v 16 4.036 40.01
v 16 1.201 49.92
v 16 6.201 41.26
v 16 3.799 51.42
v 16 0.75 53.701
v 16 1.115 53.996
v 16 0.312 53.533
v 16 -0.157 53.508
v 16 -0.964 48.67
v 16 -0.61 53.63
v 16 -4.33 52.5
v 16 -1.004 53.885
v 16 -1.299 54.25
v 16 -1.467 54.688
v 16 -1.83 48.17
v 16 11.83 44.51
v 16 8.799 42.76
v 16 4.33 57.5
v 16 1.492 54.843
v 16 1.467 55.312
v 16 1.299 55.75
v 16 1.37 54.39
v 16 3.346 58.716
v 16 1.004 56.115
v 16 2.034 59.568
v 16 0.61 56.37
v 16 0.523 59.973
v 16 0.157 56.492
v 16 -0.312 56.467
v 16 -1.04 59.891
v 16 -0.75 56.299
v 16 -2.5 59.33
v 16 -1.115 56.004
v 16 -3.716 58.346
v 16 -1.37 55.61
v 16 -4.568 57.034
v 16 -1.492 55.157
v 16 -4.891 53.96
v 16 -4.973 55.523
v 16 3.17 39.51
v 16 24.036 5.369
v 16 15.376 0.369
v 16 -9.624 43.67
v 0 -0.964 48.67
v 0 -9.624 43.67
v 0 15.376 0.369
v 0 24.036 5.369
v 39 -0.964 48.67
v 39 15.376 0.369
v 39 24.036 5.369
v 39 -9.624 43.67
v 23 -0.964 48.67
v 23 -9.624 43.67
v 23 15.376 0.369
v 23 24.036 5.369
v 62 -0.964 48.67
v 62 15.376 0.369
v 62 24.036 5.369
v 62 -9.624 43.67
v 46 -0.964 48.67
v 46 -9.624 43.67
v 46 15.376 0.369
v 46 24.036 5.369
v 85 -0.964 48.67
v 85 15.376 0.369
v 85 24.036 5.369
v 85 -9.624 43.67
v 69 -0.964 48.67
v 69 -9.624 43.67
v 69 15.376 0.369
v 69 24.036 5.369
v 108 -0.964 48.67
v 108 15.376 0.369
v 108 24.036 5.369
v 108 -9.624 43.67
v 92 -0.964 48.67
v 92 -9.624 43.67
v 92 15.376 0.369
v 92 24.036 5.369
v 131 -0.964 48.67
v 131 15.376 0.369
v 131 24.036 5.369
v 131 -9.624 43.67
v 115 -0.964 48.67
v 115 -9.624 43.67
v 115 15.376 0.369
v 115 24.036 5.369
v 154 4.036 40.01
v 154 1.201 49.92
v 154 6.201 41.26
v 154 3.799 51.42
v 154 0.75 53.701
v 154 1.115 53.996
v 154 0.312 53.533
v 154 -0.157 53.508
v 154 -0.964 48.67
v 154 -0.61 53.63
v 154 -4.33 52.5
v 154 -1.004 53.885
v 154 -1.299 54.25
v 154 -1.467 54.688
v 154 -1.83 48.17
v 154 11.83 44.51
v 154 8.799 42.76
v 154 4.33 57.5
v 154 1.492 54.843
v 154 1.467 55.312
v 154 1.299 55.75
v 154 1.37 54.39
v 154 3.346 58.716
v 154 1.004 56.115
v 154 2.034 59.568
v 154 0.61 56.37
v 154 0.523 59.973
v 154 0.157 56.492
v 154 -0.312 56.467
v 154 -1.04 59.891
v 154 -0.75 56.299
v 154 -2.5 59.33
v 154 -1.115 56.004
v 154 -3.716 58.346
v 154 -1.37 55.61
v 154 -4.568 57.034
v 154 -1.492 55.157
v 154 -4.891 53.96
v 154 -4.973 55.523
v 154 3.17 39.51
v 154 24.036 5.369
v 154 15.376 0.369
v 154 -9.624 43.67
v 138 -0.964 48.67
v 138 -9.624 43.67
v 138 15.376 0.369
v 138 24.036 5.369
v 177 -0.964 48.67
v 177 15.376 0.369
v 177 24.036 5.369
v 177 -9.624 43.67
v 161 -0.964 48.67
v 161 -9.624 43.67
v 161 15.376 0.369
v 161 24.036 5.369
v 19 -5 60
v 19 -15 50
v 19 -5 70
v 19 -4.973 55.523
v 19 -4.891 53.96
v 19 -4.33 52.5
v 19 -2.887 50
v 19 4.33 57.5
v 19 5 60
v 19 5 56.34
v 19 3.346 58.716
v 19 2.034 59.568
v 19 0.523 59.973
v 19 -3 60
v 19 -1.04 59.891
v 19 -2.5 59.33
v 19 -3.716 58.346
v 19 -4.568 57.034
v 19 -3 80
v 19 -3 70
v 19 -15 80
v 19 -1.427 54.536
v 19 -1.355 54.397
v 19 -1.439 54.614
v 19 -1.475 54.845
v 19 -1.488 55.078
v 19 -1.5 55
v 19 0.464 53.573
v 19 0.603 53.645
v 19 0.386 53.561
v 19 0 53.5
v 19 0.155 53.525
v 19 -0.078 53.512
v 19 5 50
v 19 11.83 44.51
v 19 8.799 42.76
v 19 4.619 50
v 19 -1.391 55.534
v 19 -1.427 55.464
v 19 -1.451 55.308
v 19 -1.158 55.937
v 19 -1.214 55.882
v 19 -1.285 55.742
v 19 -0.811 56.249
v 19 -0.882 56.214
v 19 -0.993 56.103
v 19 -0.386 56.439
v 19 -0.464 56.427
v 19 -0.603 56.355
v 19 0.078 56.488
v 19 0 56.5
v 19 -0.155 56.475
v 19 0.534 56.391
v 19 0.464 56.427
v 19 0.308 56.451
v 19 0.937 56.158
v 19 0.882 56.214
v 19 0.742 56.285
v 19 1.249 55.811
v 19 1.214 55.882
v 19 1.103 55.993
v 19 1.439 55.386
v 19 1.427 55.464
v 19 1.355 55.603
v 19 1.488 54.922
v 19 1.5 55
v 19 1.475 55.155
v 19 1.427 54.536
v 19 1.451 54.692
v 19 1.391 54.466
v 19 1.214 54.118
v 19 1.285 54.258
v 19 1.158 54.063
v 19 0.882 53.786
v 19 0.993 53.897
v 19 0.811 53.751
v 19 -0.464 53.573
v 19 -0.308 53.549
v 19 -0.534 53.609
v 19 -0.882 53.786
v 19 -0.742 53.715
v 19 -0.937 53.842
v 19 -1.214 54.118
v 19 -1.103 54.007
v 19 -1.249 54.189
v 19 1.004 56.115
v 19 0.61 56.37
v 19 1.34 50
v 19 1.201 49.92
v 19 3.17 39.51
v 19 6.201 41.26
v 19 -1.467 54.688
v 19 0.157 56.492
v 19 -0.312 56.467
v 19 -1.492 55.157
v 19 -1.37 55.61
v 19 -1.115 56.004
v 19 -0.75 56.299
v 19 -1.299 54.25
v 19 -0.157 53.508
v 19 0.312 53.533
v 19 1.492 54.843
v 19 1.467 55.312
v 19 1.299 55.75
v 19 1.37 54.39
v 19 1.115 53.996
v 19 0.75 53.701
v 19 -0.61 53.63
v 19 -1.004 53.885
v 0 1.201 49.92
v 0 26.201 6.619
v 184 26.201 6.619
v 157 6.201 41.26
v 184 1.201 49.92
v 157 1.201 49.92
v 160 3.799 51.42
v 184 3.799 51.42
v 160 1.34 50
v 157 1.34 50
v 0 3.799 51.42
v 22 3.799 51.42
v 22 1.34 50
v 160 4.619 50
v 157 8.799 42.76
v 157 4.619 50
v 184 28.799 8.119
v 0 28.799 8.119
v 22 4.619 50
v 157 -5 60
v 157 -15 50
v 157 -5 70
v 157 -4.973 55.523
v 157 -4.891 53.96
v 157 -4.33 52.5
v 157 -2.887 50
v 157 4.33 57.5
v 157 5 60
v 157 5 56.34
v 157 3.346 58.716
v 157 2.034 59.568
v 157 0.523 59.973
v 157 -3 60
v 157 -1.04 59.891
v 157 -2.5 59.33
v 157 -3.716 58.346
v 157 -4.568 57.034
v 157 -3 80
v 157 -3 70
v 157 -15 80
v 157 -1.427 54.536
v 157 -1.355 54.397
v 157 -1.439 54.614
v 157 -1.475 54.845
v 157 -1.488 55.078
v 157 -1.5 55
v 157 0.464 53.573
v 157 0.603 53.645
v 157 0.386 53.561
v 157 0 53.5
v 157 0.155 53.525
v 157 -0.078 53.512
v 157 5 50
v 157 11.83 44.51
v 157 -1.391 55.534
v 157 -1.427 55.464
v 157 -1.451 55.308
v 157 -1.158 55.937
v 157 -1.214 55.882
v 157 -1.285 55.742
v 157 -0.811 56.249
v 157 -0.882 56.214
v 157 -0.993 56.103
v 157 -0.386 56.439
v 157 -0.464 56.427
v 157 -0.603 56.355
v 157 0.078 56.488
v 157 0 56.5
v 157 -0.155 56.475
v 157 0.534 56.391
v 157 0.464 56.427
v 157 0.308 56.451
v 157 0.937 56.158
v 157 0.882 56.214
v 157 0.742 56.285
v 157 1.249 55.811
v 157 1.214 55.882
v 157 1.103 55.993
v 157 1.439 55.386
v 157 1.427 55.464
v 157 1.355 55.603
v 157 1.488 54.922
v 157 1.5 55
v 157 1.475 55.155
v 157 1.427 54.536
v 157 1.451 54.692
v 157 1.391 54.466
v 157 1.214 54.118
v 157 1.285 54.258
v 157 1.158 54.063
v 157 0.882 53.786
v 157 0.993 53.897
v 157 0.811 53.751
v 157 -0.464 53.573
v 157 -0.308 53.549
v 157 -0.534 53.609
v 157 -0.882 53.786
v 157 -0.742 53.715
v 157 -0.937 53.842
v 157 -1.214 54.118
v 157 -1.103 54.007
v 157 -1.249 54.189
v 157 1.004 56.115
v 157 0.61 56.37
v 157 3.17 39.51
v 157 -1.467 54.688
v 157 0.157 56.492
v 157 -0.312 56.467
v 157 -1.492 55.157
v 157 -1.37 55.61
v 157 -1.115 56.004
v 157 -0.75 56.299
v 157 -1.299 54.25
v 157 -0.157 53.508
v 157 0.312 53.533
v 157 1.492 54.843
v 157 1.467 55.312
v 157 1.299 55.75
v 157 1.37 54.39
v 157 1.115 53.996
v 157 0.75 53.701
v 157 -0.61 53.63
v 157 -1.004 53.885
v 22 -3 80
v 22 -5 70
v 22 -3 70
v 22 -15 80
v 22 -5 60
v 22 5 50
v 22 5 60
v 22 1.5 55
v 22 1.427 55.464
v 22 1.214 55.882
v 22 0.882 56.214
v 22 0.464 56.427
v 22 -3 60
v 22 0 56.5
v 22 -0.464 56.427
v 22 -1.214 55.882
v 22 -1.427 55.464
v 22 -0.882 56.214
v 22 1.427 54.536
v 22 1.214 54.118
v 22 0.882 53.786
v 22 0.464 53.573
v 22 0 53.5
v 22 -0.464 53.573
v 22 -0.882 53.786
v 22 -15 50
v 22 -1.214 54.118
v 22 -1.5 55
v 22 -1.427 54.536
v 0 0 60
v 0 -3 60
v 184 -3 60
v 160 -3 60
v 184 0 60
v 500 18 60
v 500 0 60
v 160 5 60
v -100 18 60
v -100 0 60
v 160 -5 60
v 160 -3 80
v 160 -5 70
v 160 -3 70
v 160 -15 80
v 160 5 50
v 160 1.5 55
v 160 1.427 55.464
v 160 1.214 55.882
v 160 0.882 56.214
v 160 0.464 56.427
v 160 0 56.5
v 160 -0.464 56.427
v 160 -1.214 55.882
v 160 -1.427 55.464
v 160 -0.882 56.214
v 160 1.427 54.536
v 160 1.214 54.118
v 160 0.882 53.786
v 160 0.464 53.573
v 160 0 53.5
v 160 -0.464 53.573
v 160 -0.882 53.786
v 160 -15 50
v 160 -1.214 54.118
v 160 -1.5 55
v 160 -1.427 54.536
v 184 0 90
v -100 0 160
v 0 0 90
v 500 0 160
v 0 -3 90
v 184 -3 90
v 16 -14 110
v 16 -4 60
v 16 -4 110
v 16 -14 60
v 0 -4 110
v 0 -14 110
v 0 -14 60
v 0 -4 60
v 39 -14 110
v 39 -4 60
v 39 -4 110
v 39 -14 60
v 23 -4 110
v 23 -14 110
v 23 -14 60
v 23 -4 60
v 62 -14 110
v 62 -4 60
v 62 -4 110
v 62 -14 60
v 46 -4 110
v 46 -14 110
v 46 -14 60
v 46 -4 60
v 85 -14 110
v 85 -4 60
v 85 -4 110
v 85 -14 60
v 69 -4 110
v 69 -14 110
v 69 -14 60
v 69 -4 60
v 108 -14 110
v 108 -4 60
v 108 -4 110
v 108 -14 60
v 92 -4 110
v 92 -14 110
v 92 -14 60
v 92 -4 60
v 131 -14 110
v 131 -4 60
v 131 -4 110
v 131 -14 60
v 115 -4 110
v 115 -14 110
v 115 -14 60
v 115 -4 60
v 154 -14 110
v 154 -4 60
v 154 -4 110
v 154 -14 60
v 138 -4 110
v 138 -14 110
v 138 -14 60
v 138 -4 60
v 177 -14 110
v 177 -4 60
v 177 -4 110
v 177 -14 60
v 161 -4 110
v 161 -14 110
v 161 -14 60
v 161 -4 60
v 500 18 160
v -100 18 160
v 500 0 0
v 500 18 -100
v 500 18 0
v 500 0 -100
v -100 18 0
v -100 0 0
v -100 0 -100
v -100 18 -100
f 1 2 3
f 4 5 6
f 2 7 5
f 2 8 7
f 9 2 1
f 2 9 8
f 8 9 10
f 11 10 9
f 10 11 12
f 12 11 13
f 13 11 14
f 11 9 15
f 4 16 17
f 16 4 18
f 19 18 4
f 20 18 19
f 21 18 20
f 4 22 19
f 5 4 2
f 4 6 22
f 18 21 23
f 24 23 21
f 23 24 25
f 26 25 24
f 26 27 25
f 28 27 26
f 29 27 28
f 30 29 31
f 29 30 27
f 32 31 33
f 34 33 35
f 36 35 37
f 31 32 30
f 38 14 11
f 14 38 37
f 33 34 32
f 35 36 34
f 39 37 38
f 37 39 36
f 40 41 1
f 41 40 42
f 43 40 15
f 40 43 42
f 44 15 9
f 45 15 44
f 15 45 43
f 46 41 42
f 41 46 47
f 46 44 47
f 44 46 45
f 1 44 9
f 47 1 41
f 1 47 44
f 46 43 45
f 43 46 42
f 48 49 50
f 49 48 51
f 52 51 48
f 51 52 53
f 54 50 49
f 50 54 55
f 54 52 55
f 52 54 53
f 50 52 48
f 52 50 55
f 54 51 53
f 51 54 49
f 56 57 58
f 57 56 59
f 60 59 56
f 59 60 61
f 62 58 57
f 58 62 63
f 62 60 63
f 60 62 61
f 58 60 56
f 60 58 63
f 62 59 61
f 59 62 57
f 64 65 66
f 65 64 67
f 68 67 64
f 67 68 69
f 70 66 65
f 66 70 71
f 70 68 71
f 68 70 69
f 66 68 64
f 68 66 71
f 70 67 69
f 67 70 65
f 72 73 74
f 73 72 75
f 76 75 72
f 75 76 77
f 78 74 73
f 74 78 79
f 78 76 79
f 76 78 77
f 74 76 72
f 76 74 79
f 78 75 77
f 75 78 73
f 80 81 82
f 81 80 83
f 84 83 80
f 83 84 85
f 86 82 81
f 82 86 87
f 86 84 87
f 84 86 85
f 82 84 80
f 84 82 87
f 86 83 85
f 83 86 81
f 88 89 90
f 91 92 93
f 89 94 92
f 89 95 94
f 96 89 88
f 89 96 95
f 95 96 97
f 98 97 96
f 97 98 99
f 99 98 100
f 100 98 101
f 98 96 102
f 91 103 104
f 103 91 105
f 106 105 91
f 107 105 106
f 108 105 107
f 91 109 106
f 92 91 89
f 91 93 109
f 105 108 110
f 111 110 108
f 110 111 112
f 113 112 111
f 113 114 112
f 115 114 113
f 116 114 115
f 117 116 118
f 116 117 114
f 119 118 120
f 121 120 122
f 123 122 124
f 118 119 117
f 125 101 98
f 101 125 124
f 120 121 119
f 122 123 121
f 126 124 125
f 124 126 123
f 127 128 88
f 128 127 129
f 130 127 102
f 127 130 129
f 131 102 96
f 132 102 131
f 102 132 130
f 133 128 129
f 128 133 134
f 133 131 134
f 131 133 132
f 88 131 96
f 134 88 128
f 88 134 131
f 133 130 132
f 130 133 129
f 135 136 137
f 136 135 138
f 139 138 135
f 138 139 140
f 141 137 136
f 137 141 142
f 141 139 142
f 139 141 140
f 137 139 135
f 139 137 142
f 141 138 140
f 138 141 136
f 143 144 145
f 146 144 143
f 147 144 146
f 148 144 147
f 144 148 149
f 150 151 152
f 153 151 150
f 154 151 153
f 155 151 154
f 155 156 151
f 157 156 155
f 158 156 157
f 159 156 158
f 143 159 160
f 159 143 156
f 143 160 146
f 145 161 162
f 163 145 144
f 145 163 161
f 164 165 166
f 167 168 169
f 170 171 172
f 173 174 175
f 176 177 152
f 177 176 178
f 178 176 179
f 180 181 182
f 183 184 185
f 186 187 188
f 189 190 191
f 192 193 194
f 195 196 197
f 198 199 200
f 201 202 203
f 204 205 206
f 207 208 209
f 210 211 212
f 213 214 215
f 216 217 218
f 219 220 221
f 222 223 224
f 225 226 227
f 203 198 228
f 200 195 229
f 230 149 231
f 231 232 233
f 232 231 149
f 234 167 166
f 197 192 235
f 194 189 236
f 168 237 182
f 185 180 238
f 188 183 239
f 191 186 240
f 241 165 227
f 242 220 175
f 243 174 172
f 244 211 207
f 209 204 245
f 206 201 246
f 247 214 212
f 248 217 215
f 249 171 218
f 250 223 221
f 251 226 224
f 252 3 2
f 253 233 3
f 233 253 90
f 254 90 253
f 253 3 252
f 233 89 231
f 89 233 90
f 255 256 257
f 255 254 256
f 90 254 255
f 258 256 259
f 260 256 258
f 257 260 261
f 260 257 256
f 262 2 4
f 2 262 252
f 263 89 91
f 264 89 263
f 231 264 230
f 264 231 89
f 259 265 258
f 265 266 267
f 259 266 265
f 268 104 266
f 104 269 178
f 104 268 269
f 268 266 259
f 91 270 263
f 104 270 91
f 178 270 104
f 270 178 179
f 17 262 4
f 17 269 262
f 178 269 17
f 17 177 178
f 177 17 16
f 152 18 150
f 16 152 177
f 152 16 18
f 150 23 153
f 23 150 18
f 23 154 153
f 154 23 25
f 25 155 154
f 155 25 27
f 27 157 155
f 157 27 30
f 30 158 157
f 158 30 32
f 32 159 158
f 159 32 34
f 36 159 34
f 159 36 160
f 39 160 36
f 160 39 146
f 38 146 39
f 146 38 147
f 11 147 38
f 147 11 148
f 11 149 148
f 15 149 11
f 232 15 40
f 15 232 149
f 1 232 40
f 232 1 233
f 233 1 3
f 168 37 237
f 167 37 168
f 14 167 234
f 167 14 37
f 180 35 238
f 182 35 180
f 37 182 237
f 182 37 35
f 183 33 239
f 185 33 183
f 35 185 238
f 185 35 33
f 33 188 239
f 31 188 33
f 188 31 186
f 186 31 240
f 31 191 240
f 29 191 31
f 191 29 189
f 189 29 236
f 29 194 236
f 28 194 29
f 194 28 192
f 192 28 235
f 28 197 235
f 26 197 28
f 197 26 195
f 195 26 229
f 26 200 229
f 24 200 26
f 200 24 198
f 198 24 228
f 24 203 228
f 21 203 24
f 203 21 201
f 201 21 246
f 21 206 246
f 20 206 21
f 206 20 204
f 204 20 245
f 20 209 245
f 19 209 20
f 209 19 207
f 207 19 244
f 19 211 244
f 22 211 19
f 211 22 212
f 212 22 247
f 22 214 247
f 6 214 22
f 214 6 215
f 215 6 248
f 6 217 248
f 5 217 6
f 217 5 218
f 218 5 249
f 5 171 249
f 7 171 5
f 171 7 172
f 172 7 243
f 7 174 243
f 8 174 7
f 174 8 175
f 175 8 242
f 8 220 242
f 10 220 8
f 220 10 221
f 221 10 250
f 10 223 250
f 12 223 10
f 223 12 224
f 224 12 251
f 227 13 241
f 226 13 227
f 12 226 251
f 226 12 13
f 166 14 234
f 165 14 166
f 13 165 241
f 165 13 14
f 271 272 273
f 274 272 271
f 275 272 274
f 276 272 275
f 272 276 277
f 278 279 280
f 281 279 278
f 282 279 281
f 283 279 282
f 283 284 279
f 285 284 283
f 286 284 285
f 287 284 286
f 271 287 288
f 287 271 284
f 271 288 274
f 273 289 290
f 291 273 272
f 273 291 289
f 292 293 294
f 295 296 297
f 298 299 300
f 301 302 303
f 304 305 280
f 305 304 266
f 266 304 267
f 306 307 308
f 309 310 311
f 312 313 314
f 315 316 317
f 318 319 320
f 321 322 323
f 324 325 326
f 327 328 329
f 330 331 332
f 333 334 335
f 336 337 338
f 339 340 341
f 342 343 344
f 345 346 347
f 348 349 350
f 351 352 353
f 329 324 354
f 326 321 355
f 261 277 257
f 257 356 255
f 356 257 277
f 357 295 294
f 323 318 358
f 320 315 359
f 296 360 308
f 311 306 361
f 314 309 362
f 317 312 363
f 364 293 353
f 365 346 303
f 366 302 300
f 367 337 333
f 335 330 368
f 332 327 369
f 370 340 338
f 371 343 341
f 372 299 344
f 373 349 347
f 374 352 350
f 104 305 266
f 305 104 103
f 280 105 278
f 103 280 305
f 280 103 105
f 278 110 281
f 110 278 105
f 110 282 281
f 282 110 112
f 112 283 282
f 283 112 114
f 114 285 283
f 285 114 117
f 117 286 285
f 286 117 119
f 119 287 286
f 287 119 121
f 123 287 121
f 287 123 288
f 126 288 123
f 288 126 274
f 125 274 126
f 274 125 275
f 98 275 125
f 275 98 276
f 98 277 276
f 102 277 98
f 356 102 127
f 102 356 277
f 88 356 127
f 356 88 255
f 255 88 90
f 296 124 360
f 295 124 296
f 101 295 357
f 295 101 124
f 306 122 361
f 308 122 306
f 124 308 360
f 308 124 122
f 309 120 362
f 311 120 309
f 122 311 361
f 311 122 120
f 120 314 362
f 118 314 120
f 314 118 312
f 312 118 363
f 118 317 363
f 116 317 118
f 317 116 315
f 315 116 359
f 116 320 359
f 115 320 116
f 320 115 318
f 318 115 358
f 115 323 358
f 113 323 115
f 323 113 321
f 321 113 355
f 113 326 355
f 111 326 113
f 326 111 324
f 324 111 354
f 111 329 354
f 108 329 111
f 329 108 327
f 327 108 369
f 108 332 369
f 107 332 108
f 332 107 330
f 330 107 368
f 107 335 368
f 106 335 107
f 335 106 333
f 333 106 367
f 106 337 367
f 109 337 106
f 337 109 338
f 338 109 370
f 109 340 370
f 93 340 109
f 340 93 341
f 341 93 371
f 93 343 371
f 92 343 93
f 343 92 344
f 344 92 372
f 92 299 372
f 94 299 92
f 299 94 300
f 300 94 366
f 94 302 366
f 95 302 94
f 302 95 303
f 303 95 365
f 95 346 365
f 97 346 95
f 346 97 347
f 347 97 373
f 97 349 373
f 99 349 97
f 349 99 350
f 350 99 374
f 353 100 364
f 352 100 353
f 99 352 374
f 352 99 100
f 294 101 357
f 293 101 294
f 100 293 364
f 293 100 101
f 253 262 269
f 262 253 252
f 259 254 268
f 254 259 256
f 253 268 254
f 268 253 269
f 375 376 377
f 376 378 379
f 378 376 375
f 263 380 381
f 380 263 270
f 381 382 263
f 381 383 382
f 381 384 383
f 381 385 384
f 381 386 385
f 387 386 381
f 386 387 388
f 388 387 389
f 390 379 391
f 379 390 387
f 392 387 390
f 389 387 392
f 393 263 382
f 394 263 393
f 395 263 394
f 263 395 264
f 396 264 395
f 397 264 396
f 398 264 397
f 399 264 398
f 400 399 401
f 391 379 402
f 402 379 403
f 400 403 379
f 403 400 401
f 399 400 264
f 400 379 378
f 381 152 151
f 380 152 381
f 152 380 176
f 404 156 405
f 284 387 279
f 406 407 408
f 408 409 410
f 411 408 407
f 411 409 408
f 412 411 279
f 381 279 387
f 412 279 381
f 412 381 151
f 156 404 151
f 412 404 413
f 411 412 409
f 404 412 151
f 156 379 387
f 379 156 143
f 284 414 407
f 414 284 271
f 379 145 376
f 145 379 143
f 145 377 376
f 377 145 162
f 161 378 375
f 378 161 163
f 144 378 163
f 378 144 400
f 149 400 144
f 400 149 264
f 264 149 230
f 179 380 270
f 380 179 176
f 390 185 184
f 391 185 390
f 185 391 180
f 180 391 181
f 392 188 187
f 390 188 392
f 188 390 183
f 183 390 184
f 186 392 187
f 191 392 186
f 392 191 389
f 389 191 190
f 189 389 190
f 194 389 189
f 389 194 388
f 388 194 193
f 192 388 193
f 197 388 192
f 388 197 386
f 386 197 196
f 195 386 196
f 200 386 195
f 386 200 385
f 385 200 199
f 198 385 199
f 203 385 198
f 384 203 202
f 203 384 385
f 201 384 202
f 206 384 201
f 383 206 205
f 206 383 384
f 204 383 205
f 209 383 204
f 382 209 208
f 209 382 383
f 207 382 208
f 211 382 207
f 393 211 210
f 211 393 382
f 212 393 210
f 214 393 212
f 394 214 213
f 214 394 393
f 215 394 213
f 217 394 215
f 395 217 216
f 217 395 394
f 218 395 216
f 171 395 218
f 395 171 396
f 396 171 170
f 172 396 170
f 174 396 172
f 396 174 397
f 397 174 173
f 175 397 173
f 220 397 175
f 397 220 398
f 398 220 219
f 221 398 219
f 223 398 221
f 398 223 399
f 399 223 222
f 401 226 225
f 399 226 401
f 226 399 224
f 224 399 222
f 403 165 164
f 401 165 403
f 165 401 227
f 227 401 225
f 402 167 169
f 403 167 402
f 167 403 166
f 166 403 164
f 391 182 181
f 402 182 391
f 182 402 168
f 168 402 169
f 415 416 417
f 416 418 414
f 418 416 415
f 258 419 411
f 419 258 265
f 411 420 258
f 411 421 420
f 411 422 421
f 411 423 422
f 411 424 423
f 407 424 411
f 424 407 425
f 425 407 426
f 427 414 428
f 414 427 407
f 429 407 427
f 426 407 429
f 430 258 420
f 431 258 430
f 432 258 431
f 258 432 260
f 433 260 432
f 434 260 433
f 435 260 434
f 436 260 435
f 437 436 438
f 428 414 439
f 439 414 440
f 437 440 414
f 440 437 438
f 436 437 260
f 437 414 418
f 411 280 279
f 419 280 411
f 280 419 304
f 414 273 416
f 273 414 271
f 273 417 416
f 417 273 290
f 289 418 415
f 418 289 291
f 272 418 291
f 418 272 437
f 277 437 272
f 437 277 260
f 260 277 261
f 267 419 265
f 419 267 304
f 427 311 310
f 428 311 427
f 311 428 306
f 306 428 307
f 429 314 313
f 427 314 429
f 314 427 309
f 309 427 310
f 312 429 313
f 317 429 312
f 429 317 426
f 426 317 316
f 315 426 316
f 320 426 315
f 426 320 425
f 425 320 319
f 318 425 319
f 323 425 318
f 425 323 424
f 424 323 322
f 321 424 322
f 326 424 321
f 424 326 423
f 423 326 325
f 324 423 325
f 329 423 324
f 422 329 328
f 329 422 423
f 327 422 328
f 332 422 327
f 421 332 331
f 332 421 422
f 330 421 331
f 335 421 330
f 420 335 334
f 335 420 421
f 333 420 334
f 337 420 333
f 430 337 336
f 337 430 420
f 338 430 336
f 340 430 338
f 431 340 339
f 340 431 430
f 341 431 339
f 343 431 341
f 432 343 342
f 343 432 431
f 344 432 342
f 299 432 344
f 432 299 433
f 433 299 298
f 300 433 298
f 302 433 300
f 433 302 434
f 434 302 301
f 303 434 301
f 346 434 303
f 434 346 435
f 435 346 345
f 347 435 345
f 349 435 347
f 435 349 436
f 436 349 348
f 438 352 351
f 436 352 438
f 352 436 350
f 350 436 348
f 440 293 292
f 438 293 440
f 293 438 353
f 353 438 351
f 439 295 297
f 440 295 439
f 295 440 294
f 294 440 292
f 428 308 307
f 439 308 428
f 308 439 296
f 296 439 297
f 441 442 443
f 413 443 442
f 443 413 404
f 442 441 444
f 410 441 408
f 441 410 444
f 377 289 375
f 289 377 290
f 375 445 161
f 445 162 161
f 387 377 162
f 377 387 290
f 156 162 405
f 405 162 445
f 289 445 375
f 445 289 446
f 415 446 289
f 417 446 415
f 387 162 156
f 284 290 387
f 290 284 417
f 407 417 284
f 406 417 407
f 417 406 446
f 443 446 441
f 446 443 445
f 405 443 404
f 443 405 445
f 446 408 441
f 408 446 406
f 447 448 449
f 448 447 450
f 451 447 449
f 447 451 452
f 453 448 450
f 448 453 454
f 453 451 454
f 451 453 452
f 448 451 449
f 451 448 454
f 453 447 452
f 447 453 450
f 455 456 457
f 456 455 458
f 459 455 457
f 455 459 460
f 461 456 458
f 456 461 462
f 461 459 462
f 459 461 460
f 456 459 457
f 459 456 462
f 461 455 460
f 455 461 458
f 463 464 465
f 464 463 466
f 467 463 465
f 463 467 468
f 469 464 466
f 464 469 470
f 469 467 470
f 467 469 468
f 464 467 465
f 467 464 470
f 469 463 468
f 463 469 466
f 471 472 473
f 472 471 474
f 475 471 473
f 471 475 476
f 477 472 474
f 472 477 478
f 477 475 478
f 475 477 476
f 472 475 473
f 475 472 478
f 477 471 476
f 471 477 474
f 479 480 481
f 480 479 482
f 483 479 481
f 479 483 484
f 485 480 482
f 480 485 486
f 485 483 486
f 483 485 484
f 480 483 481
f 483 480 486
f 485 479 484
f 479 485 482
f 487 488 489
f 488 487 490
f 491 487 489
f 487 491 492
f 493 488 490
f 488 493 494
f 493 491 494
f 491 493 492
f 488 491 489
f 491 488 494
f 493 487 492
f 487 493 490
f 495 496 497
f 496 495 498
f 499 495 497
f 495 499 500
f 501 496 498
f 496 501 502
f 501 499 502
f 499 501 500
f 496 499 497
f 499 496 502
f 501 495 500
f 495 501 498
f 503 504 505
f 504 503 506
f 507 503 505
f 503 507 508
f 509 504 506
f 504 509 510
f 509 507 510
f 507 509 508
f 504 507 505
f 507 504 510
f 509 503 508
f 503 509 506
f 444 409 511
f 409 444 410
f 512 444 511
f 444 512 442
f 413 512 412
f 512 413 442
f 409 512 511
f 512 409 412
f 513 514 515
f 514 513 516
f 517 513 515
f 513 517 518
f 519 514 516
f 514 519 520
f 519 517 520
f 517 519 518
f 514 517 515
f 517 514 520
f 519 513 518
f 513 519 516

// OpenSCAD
// file: interconnect.scad
// Bowden cable interconnect module

include <globs.scad>;

slider_body_length = 22;

module bowden_cable_stator()
{
  difference() {
    stator_length = slider_body_length+5+bowden_cable_travel+15;
    square([stator_length,28]);
    translate([10,10.5]) square([60,bowden_cable_inner_diameter]);
    translate([stator_length-5,10.5+bowden_cable_inner_diameter/2-bowden_cable_outer_diameter/2]) square([60,bowden_cable_outer_diameter]);
    translate([10,5]) square([slider_body_length+bowden_cable_travel,18]);

    // Mounting holes
    for(x=[5,stator_length-5]) {
      for(y=[5,28-5]) {
	translate([x,y]) circle(d=3,$fn=10);
      }
    }
  }
}

module stator_clamp()
{
  difference() {
    square([10,28]);
    for(y=[5,28-5]) {
      translate([5,y]) circle(d=3,$fn=10);
    }
  }
}

connector_inner_diameter = 2.5;
connector_width = 3.9;
connector_body_height = 4.5;
connector_total_height = 8; // That varies with compression of the cable
connector_length = 10;
peg_spacing = 5.6;
peg_top_diameter = 3.4;
peg_thread_diameter = 2.4;

module cable_connector_2d()
{
  union() {
    difference() {
      square([slider_body_length,18]);
      translate([8,5]) {
	square([connector_length, connector_body_height]);
	for(side = [-1,1]) {
	  translate([connector_length/2 + side*peg_spacing/2 - peg_thread_diameter/2,0]) square([peg_thread_diameter,connector_total_height]);
	  translate([connector_length/2 + side*peg_spacing/2 - peg_top_diameter/2,connector_total_height-2]) square([peg_top_diameter,2]);
	}
	// exit path for cable
	translate([0,0.5]) square([50,bowden_cable_inner_diameter]);
      }
      // Drive hole
      translate([4,5.5+bowden_cable_inner_diameter/2]) circle(d=3, $fn=10);
    }
  }
}
// file: globs.scad
/* Global definitions for millihertz 5 */

// Ball bearings are sold as 6mm. We have seen two
// versions, one at 6.35mm (1/4") and one at 6.15mm.

ball_bearing_diameter = 6.35;

pipe_outer_diameter = 11;

/* All dimensions are in millimetres */
memory_slope = 10; // Degrees

/** Memory cell pitch - the horizontal and vertical distances between one row and the next. Memory is arranged so one column (y) make up one word. Words are laid out vertically. */
memory_cell_pitch_x = 16;
memory_cell_pitch_y = 28 * cos(memory_slope);

/* Number of bits used in the data. This must be 32. */
bits = 32;

/* Global pitch - the horizontal spacing between each bit */
pitch = 23;

/** Frame */

frame_internal_width = 900;
frame_internal_height = 2200;

/** Frame will probably be 50mm angle iron */
frame_width = 50;

/* Bowden cable specs based on lightweight 'snake' cable */

bowden_cable_inner_diameter = 2;
bowden_cable_outer_diameter = 3.5;

bowden_cable_travel = 10;

/* Specific names for the subtractor */
subtractor_pitch_x = pitch;
subtractor_pitch_y = 27;

memory_columns_per_cell = 8;

// Memory cell height
cell_height = 14;

// Gap between two memory cell units - allows for the last useless row
// in the cell and a gap of 20 to place a delay unit if necessary. The
// delay unit may be needed to slow the ball bearing to avoid damage to
// memory selectors.
memory_unit_gap = cell_height+20;

// centre_gap is a split in the middle of the two lanes
// to join cells together (since we will likely have two
// 16-bit memory cells, and 2 16-bit adders, there will
// be a gap needed to join them.
centre_gap = 50;
// main file
// Super-simple 8-way chainable diverter using electrical conduit

include <globs.scad>;
use <interconnect.scad>;

$fn=20;
columns = 8;

support_positions = [16,(columns-2)*pitch+16];


module diversion_plate_2d()
{      square([columns*pitch,50]);
}

module support_2d() {
  difference() {
   union() {
   translate([0,-5]) square([15,10]);
   circle(d=10);
   }
    circle(d=3);
    translate([5,-1.5]) square([10,3]);
  }
}

module axle_mounting_bracket_2d() {
  difference() {
    polygon(points = [[5,5], [-5,5], [-5,-5], [-15,-5],[-15,2],[-25,2], [-25,-15], [5,-15]]);
    circle(d=3);
  }
}

module back_mounting_plate_2d()
{
  difference() {
    square([columns*pitch,30]);
    for(x=support_positions) translate([x+3,10]) square([3,10]);
  }
}


/* -------------------- 3D assembly -------------------- */

module diverter_assembly()
{
	diverter_rotate = 30;
	translate([0,0,55]) 
	rotate([diverter_rotate,0,0]) {
  	translate([0,1.5,-55]) 	rotate([90,0,0]) linear_extrude(height=3) diversion_plate_2d();

	// moving conduit
	for(i=[0:columns-1]) translate([i*pitch, -14,-55]) cube([16,10,50]);
	for(x=support_positions) translate([x,0,0]) 	rotate([0,90,0]) linear_extrude(height=3) support_2d();
	}
	for(x=support_positions) translate([x+3,0,55]) rotate([0,90,0]) linear_extrude(height=3) axle_mounting_bracket_2d();
	translate([0,0,60]) 	rotate([90,0,0]) linear_extrude(height=3) back_mounting_plate_2d();
}

translate([0,0,0]) diverter_assembly();

// Wooden plate above

translate([-100,0,60]) color([1.0,0.5,0.0]) cube([600,18,100]);
translate([-100,0,-100]) color([1.0,0.5,0.0]) cube([600,18,100]);


// fixed conduit
for(i=[0:columns-1]) translate([i*pitch, -14,60]) cube([16,10,50]);
